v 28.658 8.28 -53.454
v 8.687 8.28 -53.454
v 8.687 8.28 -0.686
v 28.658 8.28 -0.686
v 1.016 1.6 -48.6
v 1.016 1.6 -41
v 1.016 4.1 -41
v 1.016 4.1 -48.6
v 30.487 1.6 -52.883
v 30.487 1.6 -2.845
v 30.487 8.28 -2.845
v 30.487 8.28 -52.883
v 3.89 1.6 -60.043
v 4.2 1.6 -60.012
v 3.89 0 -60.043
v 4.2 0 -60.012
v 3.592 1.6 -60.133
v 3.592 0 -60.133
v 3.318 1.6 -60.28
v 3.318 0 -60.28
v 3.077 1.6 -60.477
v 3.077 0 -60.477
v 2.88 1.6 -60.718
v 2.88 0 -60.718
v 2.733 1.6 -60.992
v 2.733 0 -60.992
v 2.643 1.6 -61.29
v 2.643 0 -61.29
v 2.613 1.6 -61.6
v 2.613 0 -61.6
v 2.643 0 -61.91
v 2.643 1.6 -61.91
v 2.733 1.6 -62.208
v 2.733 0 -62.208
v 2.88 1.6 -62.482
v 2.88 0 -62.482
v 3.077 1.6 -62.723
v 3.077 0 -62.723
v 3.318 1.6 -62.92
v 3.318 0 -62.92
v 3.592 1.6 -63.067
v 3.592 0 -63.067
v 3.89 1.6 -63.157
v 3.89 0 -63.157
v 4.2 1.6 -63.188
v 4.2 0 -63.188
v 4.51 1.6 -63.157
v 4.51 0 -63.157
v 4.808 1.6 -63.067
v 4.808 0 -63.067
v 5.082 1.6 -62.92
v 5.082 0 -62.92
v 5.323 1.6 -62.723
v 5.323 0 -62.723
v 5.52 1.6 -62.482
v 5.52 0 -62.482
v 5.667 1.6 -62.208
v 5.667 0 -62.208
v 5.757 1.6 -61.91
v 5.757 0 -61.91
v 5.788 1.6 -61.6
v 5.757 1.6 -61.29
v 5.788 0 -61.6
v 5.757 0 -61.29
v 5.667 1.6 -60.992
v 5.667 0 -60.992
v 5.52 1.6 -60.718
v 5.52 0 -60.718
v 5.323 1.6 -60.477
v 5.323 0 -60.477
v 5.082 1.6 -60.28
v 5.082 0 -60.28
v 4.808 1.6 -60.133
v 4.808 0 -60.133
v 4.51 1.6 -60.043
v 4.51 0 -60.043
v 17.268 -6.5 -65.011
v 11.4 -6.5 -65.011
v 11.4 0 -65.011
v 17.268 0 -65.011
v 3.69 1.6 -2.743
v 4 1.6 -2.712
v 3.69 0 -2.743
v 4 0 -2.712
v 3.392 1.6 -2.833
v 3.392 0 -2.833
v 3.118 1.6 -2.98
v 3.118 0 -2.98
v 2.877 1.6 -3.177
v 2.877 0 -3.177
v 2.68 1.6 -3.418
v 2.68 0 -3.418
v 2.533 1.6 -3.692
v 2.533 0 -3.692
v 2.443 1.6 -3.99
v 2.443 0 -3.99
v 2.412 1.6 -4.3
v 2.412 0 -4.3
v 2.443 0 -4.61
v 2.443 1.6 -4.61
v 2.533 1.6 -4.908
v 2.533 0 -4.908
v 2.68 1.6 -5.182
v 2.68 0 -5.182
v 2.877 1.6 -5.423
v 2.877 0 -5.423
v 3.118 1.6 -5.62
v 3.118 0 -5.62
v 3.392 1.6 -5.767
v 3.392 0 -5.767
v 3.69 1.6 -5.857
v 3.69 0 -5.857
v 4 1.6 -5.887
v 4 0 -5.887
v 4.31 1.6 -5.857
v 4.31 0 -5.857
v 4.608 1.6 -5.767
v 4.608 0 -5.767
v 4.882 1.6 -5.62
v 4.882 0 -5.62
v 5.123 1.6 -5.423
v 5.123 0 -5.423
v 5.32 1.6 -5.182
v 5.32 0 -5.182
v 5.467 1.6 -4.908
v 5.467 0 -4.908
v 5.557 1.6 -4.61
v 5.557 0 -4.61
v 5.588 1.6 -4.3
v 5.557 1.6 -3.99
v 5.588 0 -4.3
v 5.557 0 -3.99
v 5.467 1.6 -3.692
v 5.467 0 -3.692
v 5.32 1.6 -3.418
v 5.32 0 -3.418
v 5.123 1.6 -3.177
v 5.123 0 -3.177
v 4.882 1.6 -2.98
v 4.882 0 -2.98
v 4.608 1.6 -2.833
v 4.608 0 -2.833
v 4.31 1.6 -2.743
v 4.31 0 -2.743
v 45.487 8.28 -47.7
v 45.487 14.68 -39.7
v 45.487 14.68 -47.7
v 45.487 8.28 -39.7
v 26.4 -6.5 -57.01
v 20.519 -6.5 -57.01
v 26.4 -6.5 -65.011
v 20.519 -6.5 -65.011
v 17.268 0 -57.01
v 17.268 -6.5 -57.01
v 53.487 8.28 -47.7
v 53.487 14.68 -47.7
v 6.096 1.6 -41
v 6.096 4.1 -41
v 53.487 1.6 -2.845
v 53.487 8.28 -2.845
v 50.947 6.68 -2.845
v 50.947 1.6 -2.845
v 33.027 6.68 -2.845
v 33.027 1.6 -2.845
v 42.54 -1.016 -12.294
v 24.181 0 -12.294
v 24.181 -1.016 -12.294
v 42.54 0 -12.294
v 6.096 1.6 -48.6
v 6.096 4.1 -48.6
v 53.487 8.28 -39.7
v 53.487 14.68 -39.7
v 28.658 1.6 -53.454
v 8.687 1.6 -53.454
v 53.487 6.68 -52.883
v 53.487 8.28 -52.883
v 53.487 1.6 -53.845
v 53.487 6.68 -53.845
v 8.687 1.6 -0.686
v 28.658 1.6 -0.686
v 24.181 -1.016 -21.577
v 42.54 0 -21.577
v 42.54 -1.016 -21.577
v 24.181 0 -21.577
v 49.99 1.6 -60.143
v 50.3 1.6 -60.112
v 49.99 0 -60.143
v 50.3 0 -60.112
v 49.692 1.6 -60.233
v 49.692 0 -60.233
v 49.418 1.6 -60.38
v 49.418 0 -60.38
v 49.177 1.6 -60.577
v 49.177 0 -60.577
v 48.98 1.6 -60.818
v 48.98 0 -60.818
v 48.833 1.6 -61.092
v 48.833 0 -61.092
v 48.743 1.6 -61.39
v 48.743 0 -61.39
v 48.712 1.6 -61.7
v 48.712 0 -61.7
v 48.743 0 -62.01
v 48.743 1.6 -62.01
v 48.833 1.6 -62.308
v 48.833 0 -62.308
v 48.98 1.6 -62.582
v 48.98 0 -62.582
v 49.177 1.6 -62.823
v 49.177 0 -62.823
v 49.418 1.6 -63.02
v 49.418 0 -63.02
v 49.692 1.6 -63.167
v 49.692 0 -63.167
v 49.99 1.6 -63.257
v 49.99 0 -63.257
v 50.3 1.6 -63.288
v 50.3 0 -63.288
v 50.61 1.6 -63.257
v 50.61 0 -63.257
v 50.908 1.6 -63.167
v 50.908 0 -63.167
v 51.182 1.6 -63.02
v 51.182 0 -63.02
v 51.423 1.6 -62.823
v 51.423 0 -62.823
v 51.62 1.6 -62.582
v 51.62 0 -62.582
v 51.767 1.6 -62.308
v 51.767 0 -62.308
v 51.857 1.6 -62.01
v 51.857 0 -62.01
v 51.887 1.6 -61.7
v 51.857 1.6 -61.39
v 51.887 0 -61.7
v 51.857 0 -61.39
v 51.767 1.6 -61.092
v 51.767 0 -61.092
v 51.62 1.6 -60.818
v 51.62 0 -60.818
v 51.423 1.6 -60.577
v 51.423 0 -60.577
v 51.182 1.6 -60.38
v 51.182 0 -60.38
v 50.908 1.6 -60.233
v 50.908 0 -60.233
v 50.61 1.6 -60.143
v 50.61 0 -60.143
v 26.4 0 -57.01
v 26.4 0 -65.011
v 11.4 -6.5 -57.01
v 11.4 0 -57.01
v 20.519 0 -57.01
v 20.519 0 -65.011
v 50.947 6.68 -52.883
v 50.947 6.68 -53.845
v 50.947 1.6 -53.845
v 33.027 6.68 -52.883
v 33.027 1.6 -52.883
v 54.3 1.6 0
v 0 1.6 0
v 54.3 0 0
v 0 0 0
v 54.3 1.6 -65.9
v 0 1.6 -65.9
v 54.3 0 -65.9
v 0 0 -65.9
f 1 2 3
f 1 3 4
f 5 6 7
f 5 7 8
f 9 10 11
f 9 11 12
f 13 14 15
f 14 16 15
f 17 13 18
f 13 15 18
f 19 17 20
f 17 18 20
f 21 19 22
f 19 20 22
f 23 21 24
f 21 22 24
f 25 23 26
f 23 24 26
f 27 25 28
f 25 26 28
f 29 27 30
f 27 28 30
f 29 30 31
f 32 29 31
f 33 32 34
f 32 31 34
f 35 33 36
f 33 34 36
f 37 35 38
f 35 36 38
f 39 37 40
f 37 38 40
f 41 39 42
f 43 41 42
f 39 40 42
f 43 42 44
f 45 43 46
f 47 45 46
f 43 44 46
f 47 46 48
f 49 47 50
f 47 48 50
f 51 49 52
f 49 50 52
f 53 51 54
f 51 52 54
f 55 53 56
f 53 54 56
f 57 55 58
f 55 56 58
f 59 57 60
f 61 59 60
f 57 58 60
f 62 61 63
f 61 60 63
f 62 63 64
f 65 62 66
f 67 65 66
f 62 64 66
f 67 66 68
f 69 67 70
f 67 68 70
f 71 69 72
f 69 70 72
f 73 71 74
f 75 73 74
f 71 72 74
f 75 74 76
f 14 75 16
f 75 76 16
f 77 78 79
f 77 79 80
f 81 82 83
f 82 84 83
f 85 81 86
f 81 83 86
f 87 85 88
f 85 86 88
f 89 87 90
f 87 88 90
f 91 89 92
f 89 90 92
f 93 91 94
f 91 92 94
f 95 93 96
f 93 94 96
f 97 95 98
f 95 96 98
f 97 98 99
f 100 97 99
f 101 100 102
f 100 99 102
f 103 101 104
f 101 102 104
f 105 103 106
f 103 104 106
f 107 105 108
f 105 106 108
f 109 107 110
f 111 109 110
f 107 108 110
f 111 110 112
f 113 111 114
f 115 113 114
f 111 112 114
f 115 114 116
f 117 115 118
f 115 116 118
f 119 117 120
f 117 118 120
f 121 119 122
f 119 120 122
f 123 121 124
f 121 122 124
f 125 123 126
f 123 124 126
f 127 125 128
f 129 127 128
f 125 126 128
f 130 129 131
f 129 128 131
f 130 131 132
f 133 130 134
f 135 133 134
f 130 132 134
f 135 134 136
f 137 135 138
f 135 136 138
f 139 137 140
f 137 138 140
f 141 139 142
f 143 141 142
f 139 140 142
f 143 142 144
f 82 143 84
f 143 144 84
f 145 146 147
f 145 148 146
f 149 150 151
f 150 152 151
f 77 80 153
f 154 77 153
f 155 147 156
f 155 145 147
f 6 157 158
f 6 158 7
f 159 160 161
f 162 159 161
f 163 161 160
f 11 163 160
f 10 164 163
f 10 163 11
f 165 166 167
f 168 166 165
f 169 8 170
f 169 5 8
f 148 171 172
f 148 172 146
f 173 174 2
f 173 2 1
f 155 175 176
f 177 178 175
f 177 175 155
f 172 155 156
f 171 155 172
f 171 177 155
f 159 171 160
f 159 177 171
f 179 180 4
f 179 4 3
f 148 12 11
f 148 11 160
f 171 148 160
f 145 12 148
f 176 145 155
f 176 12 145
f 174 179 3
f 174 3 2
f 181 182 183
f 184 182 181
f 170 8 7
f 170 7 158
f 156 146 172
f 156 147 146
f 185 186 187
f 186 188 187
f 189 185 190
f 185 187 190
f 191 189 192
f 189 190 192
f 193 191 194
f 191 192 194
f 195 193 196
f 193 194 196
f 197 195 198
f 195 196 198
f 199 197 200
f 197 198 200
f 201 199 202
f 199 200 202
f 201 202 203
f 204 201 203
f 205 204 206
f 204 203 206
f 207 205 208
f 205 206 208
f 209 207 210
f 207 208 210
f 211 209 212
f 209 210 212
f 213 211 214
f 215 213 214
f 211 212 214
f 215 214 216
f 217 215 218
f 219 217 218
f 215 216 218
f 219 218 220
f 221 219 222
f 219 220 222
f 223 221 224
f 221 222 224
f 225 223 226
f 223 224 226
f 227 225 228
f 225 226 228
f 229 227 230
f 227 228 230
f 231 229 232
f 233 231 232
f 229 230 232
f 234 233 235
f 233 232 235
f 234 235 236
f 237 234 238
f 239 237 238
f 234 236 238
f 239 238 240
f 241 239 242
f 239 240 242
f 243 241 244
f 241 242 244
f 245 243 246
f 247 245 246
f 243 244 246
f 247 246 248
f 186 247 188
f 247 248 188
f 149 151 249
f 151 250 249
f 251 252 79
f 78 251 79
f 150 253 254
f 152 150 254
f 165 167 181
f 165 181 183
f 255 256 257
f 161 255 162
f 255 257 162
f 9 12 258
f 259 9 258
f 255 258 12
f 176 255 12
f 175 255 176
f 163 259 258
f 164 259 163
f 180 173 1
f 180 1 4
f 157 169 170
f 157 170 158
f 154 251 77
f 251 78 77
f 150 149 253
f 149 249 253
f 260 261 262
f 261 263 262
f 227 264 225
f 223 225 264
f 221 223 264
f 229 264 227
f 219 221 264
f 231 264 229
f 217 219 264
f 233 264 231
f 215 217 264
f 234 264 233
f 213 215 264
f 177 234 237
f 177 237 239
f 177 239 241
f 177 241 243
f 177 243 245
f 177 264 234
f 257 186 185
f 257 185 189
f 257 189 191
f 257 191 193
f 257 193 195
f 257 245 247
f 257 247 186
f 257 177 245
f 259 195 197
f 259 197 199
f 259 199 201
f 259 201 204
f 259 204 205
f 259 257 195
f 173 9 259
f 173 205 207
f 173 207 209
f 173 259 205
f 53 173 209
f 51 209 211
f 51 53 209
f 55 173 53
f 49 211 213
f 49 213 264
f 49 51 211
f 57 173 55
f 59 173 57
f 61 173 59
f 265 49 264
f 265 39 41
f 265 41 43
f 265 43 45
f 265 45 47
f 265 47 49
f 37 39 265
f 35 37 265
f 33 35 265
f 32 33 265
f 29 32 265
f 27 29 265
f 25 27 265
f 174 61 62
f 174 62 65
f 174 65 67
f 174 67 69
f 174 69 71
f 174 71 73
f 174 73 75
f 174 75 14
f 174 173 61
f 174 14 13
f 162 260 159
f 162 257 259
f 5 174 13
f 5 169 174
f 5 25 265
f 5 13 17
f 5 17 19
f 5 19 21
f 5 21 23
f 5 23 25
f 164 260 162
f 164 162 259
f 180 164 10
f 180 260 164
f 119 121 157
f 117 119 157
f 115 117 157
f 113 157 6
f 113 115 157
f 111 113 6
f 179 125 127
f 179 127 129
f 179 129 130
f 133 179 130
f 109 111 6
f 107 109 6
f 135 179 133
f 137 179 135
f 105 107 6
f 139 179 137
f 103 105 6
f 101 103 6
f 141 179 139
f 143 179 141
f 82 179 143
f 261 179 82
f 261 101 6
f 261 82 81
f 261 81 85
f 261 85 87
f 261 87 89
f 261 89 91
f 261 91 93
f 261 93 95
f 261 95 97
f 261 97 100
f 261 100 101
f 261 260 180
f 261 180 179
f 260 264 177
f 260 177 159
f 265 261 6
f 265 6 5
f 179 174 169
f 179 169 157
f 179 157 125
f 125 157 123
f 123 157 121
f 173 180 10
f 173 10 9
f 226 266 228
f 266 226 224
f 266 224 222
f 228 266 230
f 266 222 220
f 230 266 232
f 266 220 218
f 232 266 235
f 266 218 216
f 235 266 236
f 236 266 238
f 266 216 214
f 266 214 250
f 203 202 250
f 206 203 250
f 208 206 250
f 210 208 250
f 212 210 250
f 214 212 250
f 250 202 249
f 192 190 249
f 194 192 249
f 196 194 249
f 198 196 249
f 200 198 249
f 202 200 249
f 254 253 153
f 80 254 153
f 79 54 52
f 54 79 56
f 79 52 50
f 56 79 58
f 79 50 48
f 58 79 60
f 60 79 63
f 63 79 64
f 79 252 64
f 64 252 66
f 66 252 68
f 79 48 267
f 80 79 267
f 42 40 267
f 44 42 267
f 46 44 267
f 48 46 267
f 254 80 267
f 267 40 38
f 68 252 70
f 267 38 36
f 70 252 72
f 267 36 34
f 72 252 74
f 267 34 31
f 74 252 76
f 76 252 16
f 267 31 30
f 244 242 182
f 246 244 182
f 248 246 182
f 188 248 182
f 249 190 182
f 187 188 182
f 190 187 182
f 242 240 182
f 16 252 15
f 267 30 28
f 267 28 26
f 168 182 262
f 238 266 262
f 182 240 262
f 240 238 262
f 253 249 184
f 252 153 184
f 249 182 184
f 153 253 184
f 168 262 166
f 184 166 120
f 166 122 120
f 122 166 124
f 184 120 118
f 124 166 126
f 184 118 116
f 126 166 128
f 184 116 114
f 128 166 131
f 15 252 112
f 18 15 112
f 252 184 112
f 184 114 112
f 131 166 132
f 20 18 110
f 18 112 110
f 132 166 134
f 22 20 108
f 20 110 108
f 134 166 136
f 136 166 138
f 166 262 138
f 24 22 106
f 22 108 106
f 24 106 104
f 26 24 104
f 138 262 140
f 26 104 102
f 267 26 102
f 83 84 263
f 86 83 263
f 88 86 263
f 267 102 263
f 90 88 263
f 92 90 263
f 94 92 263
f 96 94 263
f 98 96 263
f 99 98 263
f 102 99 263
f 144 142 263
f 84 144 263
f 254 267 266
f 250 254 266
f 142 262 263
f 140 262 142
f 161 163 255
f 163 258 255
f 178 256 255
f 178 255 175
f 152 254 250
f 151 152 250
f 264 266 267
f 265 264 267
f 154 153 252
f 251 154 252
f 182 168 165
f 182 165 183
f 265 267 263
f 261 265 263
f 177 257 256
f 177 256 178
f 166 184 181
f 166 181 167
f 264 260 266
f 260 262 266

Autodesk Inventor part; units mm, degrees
ref_plane "YZ Plane" through (0, 0, 0) normal (1, 0, 0) x (0, 1, 0)
ref_plane "XZ Plane" through (0, 0, 0) normal (0, 1, 0) x (-1, 0, 0)
ref_plane "XY Plane" through (0, 0, 0) normal (0, 0, 1) x (1, 0, 0)
sketch "Sketch1" plane through (0, 0, 0) normal (0, 1, 0) x (-1, 0, 0)
  line L0 (0, 0) -> (-54.3, 0)
  line L1 (-54.3, 0) -> (-54.3, -65.9)
  line L2 (-54.3, -65.9) -> (0, -65.9)
  line L3 (0, -65.9) -> (0, 0)
  dimension "d0" = 54.3
  dimension "d1" = 65.9
extrude "Extrusion1" add sketch "Sketch1" along normal blind 1.6
sketch "Sketch2" plane through (0, 1.6, 0) normal (0, 1, 0) x (1, 0, 0)
  line L0 (0, 65.9) -> (0, 0) projected
  line L1 (54.3, 65.9) -> (0, 65.9) projected
  line L2 (54.3, 0) -> (54.3, 65.9) projected
  line L3 (0, 0) -> (54.3, 0) projected
  point P0 (4.2, 61.6)
  point P1 (50.3, 61.7)
  point P2 (4, 4.3)
  dimension "d4" = 4.2
  dimension "d5" = 4.3
  dimension "d6" = 4
  dimension "d7" = 4.2
  dimension "d8" = 4
  dimension "d9" = 4.3
hole "Hole1" at (4.2, 1.6, -61.6) at (50.3, 1.6, -61.7) at (4, 1.6, -4.3) direction (0, -1, 0) diameter 3.175 end through all
sketch "Sketch3" plane through (0, 1.6, 0) normal (0, 1, 0) x (1, 0, 0)
  line L0 (53.4872, 53.8448) -> (53.4872, 2.8448)
  line L1 (30.4872, 2.8448) -> (30.4872, 52.8828)
  line L2 (0, 0) -> (54.3, 0) projected
  line L3 (54.3, 0) -> (54.3, 65.9) projected
  line L4 (33.0272, 52.8828) -> (33.0272, 2.8448)
  line L5 (50.9472, 53.8448) -> (50.9472, 2.8448)
  line L6 (30.4872, 52.8828) -> (33.0272, 52.8828)
  line L7 (50.9472, 53.8448) -> (53.4872, 53.8448)
  line L8 (53.4872, 2.8448) -> (50.9472, 2.8448)
  line L9 (33.0272, 2.8448) -> (30.4872, 2.8448)
  dimension "d17" = 23
  dimension "d18" = 51
  dimension "d20" = 0.8128
  dimension "d21" = 2.54
  dimension "d22" = 2.54
extrude "Extrusion2" add sketch "Sketch3" along normal blind 5.08
sketch "Sketch4" plane through (0, 6.68, 0) normal (0, 1, 0) x (1, 0, 0)
  line L0 (30.4872, 52.8828) -> (30.4872, 2.8448) projected
  line L1 (30.4872, 2.8448) -> (33.0272, 2.8448) projected
  line L2 (33.0272, 2.8448) -> (33.0272, 52.8828) projected
  line L3 (33.0272, 52.8828) -> (30.4872, 52.8828) projected
  line L4 (53.4872, 2.8448) -> (53.4872, 53.8448) projected
  line L5 (50.9472, 53.8448) -> (50.9472, 2.8448) projected
  line L6 (50.9472, 2.8448) -> (53.4872, 2.8448) projected
  line L7 (53.4872, 53.8448) -> (50.9472, 53.8448) projected
  line L8 (30.4872, 52.8828) -> (30.4872, 2.8448) projected
  line L9 (30.4872, 52.8828) -> (53.4872, 52.8828)
  line L10 (53.4872, 52.8828) -> (53.4872, 2.8448)
  line L11 (53.4872, 2.8448) -> (30.4872, 2.8448)
  line L12 (30.4872, 2.8448) -> (30.4872, 52.8828)
  point P0 (0, 0)
extrude "Extrusion3" add sketch "Sketch4" along normal blind 1.6 contours L3 L2 L1 L0 | L9 L5 L11 L2 | L9 L4 L6 L5
sketch "Sketch5" plane through (0, 8.28, 0) normal (0, 1, 0) x (1, 0, 0)
  line L0 (45.4872, 47.7) -> (53.4872, 47.7)
  line L1 (53.4872, 47.7) -> (53.4872, 39.7)
  line L2 (53.4872, 39.7) -> (45.4872, 39.7)
  line L3 (45.4872, 39.7) -> (45.4872, 47.7)
  line L4 (53.4872, 2.8448) -> (53.4872, 52.8828) projected
  line L5 (53.4872, 52.8828) -> (30.4872, 52.8828) projected
  line L6 (0, 0) -> (54.3, 0) projected
  line L7 (30.4872, 52.8828) -> (30.4872, 2.8448) projected
  line L8 (30.4872, 2.8448) -> (53.4872, 2.8448) projected
  line L9 (53.4872, 2.8448) -> (53.4872, 52.8828) projected
  line L10 (53.4872, 52.8828) -> (30.4872, 52.8828) projected
  dimension "d27" = 8
  dimension "d28" = 8
  dimension "d61" = 39.7
extrude "Extrusion4" add sketch "Sketch5" along normal blind 6.4 contours L0 L1 L2 L3
sketch "Sketch7" plane through (0, 1.6, 0) normal (0, 1, 0) x (1, 0, 0)
  line L0 (1.016, 48.6) -> (6.096, 48.6)
  line L1 (6.096, 48.6) -> (6.096, 41)
  line L2 (6.096, 41) -> (1.016, 41)
  line L3 (1.016, 41) -> (1.016, 48.6)
  line L4 (54.3, 65.9) -> (0, 65.9) projected
  line L5 (0, 65.9) -> (0, 0) projected
  dimension "d32" = 5.08
  dimension "d33" = 7.6
  dimension "d34" = 17.3
  dimension "d35" = 1.016
extrude "Extrusion5" add sketch "Sketch7" along normal blind 2.5
sketch "Sketch8" plane through (0, 1.6, 0) normal (0, 1, 0) x (1, 0, 0)
  line L0 (11.4, 65.011) -> (17.268, 65.011)
  line L1 (17.268, 65.011) -> (17.268, 57.01)
  line L2 (17.268, 57.01) -> (11.4, 57.01)
  line L3 (11.4, 57.01) -> (11.4, 65.011)
  line L4 (0, 65.9) -> (0, 0) projected
  line L5 (54.3, 65.9) -> (0, 65.9) projected
  line L6 (20.5192, 65.011) -> (26.4, 65.011)
  line L7 (26.4, 65.011) -> (26.4, 57.01)
  line L8 (26.4, 57.01) -> (20.5192, 57.01)
  line L9 (20.5192, 57.01) -> (20.5192, 65.011)
  dimension "d39" = 8.001
  dimension "d40" = 11.4
  dimension "d41" = 0.889
  dimension "d43" = 8.001
  dimension "d44" = 3.2512
  dimension "d45" = 0.889
  dimension "d60" = 15
extrude "Extrusion6" add sketch "Sketch8" against normal blind 8.1
sketch "Sketch9" plane through (0, 1.6, 0) normal (0, 1, 0) x (1, 0, 0)
  line L0 (8.6868, 53.454) -> (28.6584, 53.454)
  line L1 (28.6584, 53.454) -> (28.6584, 0.6858)
  line L2 (28.6584, 0.6858) -> (8.6868, 0.6858)
  line L3 (8.6868, 0.6858) -> (8.6868, 53.454)
  line L4 (54.3, 65.9) -> (0, 65.9) projected
  line L5 (30.4872, 52.8828) -> (30.4872, 2.8448) projected
  line L6 (0, 65.9) -> (0, 0) projected
  line L7 (0, 0) -> (54.3, 0) projected
  dimension "d48" = 12.446
  dimension "d49" = 1.8288
  dimension "d50" = 8.6868
  dimension "d51" = 0.6858
extrude "Extrusion7" add sketch "Sketch9" along normal up to surface (6.68 mm away)
sketch "Sketch10" plane through (0, 0, 0) normal (0, -1, 0) x (1, 0, 0)
  line L0 (42.5398, -21.577) -> (24.1808, -21.577)
  line L1 (24.1808, -21.577) -> (24.1808, -12.2936)
  line L2 (24.1808, -12.2936) -> (42.5398, -12.2936)
  line L3 (42.5398, -12.2936) -> (42.5398, -21.577)
  line L4 (54.3, -65.9) -> (0, -65.9) projected
  line L5 (54.3, 0) -> (54.3, -65.9) projected
  line L6 (0, -65.9) -> (0, 0) projected
  line L7 (0, 0) -> (54.3, 0) projected
  dimension "d54" = 44.323
  dimension "d55" = 11.7602
  dimension "d56" = 24.1808
  dimension "d57" = 12.2936
extrude "Extrusion8" add sketch "Sketch10" along normal blind 1.016 contours L0 L1 L2 L3
properties part number "PCB"
